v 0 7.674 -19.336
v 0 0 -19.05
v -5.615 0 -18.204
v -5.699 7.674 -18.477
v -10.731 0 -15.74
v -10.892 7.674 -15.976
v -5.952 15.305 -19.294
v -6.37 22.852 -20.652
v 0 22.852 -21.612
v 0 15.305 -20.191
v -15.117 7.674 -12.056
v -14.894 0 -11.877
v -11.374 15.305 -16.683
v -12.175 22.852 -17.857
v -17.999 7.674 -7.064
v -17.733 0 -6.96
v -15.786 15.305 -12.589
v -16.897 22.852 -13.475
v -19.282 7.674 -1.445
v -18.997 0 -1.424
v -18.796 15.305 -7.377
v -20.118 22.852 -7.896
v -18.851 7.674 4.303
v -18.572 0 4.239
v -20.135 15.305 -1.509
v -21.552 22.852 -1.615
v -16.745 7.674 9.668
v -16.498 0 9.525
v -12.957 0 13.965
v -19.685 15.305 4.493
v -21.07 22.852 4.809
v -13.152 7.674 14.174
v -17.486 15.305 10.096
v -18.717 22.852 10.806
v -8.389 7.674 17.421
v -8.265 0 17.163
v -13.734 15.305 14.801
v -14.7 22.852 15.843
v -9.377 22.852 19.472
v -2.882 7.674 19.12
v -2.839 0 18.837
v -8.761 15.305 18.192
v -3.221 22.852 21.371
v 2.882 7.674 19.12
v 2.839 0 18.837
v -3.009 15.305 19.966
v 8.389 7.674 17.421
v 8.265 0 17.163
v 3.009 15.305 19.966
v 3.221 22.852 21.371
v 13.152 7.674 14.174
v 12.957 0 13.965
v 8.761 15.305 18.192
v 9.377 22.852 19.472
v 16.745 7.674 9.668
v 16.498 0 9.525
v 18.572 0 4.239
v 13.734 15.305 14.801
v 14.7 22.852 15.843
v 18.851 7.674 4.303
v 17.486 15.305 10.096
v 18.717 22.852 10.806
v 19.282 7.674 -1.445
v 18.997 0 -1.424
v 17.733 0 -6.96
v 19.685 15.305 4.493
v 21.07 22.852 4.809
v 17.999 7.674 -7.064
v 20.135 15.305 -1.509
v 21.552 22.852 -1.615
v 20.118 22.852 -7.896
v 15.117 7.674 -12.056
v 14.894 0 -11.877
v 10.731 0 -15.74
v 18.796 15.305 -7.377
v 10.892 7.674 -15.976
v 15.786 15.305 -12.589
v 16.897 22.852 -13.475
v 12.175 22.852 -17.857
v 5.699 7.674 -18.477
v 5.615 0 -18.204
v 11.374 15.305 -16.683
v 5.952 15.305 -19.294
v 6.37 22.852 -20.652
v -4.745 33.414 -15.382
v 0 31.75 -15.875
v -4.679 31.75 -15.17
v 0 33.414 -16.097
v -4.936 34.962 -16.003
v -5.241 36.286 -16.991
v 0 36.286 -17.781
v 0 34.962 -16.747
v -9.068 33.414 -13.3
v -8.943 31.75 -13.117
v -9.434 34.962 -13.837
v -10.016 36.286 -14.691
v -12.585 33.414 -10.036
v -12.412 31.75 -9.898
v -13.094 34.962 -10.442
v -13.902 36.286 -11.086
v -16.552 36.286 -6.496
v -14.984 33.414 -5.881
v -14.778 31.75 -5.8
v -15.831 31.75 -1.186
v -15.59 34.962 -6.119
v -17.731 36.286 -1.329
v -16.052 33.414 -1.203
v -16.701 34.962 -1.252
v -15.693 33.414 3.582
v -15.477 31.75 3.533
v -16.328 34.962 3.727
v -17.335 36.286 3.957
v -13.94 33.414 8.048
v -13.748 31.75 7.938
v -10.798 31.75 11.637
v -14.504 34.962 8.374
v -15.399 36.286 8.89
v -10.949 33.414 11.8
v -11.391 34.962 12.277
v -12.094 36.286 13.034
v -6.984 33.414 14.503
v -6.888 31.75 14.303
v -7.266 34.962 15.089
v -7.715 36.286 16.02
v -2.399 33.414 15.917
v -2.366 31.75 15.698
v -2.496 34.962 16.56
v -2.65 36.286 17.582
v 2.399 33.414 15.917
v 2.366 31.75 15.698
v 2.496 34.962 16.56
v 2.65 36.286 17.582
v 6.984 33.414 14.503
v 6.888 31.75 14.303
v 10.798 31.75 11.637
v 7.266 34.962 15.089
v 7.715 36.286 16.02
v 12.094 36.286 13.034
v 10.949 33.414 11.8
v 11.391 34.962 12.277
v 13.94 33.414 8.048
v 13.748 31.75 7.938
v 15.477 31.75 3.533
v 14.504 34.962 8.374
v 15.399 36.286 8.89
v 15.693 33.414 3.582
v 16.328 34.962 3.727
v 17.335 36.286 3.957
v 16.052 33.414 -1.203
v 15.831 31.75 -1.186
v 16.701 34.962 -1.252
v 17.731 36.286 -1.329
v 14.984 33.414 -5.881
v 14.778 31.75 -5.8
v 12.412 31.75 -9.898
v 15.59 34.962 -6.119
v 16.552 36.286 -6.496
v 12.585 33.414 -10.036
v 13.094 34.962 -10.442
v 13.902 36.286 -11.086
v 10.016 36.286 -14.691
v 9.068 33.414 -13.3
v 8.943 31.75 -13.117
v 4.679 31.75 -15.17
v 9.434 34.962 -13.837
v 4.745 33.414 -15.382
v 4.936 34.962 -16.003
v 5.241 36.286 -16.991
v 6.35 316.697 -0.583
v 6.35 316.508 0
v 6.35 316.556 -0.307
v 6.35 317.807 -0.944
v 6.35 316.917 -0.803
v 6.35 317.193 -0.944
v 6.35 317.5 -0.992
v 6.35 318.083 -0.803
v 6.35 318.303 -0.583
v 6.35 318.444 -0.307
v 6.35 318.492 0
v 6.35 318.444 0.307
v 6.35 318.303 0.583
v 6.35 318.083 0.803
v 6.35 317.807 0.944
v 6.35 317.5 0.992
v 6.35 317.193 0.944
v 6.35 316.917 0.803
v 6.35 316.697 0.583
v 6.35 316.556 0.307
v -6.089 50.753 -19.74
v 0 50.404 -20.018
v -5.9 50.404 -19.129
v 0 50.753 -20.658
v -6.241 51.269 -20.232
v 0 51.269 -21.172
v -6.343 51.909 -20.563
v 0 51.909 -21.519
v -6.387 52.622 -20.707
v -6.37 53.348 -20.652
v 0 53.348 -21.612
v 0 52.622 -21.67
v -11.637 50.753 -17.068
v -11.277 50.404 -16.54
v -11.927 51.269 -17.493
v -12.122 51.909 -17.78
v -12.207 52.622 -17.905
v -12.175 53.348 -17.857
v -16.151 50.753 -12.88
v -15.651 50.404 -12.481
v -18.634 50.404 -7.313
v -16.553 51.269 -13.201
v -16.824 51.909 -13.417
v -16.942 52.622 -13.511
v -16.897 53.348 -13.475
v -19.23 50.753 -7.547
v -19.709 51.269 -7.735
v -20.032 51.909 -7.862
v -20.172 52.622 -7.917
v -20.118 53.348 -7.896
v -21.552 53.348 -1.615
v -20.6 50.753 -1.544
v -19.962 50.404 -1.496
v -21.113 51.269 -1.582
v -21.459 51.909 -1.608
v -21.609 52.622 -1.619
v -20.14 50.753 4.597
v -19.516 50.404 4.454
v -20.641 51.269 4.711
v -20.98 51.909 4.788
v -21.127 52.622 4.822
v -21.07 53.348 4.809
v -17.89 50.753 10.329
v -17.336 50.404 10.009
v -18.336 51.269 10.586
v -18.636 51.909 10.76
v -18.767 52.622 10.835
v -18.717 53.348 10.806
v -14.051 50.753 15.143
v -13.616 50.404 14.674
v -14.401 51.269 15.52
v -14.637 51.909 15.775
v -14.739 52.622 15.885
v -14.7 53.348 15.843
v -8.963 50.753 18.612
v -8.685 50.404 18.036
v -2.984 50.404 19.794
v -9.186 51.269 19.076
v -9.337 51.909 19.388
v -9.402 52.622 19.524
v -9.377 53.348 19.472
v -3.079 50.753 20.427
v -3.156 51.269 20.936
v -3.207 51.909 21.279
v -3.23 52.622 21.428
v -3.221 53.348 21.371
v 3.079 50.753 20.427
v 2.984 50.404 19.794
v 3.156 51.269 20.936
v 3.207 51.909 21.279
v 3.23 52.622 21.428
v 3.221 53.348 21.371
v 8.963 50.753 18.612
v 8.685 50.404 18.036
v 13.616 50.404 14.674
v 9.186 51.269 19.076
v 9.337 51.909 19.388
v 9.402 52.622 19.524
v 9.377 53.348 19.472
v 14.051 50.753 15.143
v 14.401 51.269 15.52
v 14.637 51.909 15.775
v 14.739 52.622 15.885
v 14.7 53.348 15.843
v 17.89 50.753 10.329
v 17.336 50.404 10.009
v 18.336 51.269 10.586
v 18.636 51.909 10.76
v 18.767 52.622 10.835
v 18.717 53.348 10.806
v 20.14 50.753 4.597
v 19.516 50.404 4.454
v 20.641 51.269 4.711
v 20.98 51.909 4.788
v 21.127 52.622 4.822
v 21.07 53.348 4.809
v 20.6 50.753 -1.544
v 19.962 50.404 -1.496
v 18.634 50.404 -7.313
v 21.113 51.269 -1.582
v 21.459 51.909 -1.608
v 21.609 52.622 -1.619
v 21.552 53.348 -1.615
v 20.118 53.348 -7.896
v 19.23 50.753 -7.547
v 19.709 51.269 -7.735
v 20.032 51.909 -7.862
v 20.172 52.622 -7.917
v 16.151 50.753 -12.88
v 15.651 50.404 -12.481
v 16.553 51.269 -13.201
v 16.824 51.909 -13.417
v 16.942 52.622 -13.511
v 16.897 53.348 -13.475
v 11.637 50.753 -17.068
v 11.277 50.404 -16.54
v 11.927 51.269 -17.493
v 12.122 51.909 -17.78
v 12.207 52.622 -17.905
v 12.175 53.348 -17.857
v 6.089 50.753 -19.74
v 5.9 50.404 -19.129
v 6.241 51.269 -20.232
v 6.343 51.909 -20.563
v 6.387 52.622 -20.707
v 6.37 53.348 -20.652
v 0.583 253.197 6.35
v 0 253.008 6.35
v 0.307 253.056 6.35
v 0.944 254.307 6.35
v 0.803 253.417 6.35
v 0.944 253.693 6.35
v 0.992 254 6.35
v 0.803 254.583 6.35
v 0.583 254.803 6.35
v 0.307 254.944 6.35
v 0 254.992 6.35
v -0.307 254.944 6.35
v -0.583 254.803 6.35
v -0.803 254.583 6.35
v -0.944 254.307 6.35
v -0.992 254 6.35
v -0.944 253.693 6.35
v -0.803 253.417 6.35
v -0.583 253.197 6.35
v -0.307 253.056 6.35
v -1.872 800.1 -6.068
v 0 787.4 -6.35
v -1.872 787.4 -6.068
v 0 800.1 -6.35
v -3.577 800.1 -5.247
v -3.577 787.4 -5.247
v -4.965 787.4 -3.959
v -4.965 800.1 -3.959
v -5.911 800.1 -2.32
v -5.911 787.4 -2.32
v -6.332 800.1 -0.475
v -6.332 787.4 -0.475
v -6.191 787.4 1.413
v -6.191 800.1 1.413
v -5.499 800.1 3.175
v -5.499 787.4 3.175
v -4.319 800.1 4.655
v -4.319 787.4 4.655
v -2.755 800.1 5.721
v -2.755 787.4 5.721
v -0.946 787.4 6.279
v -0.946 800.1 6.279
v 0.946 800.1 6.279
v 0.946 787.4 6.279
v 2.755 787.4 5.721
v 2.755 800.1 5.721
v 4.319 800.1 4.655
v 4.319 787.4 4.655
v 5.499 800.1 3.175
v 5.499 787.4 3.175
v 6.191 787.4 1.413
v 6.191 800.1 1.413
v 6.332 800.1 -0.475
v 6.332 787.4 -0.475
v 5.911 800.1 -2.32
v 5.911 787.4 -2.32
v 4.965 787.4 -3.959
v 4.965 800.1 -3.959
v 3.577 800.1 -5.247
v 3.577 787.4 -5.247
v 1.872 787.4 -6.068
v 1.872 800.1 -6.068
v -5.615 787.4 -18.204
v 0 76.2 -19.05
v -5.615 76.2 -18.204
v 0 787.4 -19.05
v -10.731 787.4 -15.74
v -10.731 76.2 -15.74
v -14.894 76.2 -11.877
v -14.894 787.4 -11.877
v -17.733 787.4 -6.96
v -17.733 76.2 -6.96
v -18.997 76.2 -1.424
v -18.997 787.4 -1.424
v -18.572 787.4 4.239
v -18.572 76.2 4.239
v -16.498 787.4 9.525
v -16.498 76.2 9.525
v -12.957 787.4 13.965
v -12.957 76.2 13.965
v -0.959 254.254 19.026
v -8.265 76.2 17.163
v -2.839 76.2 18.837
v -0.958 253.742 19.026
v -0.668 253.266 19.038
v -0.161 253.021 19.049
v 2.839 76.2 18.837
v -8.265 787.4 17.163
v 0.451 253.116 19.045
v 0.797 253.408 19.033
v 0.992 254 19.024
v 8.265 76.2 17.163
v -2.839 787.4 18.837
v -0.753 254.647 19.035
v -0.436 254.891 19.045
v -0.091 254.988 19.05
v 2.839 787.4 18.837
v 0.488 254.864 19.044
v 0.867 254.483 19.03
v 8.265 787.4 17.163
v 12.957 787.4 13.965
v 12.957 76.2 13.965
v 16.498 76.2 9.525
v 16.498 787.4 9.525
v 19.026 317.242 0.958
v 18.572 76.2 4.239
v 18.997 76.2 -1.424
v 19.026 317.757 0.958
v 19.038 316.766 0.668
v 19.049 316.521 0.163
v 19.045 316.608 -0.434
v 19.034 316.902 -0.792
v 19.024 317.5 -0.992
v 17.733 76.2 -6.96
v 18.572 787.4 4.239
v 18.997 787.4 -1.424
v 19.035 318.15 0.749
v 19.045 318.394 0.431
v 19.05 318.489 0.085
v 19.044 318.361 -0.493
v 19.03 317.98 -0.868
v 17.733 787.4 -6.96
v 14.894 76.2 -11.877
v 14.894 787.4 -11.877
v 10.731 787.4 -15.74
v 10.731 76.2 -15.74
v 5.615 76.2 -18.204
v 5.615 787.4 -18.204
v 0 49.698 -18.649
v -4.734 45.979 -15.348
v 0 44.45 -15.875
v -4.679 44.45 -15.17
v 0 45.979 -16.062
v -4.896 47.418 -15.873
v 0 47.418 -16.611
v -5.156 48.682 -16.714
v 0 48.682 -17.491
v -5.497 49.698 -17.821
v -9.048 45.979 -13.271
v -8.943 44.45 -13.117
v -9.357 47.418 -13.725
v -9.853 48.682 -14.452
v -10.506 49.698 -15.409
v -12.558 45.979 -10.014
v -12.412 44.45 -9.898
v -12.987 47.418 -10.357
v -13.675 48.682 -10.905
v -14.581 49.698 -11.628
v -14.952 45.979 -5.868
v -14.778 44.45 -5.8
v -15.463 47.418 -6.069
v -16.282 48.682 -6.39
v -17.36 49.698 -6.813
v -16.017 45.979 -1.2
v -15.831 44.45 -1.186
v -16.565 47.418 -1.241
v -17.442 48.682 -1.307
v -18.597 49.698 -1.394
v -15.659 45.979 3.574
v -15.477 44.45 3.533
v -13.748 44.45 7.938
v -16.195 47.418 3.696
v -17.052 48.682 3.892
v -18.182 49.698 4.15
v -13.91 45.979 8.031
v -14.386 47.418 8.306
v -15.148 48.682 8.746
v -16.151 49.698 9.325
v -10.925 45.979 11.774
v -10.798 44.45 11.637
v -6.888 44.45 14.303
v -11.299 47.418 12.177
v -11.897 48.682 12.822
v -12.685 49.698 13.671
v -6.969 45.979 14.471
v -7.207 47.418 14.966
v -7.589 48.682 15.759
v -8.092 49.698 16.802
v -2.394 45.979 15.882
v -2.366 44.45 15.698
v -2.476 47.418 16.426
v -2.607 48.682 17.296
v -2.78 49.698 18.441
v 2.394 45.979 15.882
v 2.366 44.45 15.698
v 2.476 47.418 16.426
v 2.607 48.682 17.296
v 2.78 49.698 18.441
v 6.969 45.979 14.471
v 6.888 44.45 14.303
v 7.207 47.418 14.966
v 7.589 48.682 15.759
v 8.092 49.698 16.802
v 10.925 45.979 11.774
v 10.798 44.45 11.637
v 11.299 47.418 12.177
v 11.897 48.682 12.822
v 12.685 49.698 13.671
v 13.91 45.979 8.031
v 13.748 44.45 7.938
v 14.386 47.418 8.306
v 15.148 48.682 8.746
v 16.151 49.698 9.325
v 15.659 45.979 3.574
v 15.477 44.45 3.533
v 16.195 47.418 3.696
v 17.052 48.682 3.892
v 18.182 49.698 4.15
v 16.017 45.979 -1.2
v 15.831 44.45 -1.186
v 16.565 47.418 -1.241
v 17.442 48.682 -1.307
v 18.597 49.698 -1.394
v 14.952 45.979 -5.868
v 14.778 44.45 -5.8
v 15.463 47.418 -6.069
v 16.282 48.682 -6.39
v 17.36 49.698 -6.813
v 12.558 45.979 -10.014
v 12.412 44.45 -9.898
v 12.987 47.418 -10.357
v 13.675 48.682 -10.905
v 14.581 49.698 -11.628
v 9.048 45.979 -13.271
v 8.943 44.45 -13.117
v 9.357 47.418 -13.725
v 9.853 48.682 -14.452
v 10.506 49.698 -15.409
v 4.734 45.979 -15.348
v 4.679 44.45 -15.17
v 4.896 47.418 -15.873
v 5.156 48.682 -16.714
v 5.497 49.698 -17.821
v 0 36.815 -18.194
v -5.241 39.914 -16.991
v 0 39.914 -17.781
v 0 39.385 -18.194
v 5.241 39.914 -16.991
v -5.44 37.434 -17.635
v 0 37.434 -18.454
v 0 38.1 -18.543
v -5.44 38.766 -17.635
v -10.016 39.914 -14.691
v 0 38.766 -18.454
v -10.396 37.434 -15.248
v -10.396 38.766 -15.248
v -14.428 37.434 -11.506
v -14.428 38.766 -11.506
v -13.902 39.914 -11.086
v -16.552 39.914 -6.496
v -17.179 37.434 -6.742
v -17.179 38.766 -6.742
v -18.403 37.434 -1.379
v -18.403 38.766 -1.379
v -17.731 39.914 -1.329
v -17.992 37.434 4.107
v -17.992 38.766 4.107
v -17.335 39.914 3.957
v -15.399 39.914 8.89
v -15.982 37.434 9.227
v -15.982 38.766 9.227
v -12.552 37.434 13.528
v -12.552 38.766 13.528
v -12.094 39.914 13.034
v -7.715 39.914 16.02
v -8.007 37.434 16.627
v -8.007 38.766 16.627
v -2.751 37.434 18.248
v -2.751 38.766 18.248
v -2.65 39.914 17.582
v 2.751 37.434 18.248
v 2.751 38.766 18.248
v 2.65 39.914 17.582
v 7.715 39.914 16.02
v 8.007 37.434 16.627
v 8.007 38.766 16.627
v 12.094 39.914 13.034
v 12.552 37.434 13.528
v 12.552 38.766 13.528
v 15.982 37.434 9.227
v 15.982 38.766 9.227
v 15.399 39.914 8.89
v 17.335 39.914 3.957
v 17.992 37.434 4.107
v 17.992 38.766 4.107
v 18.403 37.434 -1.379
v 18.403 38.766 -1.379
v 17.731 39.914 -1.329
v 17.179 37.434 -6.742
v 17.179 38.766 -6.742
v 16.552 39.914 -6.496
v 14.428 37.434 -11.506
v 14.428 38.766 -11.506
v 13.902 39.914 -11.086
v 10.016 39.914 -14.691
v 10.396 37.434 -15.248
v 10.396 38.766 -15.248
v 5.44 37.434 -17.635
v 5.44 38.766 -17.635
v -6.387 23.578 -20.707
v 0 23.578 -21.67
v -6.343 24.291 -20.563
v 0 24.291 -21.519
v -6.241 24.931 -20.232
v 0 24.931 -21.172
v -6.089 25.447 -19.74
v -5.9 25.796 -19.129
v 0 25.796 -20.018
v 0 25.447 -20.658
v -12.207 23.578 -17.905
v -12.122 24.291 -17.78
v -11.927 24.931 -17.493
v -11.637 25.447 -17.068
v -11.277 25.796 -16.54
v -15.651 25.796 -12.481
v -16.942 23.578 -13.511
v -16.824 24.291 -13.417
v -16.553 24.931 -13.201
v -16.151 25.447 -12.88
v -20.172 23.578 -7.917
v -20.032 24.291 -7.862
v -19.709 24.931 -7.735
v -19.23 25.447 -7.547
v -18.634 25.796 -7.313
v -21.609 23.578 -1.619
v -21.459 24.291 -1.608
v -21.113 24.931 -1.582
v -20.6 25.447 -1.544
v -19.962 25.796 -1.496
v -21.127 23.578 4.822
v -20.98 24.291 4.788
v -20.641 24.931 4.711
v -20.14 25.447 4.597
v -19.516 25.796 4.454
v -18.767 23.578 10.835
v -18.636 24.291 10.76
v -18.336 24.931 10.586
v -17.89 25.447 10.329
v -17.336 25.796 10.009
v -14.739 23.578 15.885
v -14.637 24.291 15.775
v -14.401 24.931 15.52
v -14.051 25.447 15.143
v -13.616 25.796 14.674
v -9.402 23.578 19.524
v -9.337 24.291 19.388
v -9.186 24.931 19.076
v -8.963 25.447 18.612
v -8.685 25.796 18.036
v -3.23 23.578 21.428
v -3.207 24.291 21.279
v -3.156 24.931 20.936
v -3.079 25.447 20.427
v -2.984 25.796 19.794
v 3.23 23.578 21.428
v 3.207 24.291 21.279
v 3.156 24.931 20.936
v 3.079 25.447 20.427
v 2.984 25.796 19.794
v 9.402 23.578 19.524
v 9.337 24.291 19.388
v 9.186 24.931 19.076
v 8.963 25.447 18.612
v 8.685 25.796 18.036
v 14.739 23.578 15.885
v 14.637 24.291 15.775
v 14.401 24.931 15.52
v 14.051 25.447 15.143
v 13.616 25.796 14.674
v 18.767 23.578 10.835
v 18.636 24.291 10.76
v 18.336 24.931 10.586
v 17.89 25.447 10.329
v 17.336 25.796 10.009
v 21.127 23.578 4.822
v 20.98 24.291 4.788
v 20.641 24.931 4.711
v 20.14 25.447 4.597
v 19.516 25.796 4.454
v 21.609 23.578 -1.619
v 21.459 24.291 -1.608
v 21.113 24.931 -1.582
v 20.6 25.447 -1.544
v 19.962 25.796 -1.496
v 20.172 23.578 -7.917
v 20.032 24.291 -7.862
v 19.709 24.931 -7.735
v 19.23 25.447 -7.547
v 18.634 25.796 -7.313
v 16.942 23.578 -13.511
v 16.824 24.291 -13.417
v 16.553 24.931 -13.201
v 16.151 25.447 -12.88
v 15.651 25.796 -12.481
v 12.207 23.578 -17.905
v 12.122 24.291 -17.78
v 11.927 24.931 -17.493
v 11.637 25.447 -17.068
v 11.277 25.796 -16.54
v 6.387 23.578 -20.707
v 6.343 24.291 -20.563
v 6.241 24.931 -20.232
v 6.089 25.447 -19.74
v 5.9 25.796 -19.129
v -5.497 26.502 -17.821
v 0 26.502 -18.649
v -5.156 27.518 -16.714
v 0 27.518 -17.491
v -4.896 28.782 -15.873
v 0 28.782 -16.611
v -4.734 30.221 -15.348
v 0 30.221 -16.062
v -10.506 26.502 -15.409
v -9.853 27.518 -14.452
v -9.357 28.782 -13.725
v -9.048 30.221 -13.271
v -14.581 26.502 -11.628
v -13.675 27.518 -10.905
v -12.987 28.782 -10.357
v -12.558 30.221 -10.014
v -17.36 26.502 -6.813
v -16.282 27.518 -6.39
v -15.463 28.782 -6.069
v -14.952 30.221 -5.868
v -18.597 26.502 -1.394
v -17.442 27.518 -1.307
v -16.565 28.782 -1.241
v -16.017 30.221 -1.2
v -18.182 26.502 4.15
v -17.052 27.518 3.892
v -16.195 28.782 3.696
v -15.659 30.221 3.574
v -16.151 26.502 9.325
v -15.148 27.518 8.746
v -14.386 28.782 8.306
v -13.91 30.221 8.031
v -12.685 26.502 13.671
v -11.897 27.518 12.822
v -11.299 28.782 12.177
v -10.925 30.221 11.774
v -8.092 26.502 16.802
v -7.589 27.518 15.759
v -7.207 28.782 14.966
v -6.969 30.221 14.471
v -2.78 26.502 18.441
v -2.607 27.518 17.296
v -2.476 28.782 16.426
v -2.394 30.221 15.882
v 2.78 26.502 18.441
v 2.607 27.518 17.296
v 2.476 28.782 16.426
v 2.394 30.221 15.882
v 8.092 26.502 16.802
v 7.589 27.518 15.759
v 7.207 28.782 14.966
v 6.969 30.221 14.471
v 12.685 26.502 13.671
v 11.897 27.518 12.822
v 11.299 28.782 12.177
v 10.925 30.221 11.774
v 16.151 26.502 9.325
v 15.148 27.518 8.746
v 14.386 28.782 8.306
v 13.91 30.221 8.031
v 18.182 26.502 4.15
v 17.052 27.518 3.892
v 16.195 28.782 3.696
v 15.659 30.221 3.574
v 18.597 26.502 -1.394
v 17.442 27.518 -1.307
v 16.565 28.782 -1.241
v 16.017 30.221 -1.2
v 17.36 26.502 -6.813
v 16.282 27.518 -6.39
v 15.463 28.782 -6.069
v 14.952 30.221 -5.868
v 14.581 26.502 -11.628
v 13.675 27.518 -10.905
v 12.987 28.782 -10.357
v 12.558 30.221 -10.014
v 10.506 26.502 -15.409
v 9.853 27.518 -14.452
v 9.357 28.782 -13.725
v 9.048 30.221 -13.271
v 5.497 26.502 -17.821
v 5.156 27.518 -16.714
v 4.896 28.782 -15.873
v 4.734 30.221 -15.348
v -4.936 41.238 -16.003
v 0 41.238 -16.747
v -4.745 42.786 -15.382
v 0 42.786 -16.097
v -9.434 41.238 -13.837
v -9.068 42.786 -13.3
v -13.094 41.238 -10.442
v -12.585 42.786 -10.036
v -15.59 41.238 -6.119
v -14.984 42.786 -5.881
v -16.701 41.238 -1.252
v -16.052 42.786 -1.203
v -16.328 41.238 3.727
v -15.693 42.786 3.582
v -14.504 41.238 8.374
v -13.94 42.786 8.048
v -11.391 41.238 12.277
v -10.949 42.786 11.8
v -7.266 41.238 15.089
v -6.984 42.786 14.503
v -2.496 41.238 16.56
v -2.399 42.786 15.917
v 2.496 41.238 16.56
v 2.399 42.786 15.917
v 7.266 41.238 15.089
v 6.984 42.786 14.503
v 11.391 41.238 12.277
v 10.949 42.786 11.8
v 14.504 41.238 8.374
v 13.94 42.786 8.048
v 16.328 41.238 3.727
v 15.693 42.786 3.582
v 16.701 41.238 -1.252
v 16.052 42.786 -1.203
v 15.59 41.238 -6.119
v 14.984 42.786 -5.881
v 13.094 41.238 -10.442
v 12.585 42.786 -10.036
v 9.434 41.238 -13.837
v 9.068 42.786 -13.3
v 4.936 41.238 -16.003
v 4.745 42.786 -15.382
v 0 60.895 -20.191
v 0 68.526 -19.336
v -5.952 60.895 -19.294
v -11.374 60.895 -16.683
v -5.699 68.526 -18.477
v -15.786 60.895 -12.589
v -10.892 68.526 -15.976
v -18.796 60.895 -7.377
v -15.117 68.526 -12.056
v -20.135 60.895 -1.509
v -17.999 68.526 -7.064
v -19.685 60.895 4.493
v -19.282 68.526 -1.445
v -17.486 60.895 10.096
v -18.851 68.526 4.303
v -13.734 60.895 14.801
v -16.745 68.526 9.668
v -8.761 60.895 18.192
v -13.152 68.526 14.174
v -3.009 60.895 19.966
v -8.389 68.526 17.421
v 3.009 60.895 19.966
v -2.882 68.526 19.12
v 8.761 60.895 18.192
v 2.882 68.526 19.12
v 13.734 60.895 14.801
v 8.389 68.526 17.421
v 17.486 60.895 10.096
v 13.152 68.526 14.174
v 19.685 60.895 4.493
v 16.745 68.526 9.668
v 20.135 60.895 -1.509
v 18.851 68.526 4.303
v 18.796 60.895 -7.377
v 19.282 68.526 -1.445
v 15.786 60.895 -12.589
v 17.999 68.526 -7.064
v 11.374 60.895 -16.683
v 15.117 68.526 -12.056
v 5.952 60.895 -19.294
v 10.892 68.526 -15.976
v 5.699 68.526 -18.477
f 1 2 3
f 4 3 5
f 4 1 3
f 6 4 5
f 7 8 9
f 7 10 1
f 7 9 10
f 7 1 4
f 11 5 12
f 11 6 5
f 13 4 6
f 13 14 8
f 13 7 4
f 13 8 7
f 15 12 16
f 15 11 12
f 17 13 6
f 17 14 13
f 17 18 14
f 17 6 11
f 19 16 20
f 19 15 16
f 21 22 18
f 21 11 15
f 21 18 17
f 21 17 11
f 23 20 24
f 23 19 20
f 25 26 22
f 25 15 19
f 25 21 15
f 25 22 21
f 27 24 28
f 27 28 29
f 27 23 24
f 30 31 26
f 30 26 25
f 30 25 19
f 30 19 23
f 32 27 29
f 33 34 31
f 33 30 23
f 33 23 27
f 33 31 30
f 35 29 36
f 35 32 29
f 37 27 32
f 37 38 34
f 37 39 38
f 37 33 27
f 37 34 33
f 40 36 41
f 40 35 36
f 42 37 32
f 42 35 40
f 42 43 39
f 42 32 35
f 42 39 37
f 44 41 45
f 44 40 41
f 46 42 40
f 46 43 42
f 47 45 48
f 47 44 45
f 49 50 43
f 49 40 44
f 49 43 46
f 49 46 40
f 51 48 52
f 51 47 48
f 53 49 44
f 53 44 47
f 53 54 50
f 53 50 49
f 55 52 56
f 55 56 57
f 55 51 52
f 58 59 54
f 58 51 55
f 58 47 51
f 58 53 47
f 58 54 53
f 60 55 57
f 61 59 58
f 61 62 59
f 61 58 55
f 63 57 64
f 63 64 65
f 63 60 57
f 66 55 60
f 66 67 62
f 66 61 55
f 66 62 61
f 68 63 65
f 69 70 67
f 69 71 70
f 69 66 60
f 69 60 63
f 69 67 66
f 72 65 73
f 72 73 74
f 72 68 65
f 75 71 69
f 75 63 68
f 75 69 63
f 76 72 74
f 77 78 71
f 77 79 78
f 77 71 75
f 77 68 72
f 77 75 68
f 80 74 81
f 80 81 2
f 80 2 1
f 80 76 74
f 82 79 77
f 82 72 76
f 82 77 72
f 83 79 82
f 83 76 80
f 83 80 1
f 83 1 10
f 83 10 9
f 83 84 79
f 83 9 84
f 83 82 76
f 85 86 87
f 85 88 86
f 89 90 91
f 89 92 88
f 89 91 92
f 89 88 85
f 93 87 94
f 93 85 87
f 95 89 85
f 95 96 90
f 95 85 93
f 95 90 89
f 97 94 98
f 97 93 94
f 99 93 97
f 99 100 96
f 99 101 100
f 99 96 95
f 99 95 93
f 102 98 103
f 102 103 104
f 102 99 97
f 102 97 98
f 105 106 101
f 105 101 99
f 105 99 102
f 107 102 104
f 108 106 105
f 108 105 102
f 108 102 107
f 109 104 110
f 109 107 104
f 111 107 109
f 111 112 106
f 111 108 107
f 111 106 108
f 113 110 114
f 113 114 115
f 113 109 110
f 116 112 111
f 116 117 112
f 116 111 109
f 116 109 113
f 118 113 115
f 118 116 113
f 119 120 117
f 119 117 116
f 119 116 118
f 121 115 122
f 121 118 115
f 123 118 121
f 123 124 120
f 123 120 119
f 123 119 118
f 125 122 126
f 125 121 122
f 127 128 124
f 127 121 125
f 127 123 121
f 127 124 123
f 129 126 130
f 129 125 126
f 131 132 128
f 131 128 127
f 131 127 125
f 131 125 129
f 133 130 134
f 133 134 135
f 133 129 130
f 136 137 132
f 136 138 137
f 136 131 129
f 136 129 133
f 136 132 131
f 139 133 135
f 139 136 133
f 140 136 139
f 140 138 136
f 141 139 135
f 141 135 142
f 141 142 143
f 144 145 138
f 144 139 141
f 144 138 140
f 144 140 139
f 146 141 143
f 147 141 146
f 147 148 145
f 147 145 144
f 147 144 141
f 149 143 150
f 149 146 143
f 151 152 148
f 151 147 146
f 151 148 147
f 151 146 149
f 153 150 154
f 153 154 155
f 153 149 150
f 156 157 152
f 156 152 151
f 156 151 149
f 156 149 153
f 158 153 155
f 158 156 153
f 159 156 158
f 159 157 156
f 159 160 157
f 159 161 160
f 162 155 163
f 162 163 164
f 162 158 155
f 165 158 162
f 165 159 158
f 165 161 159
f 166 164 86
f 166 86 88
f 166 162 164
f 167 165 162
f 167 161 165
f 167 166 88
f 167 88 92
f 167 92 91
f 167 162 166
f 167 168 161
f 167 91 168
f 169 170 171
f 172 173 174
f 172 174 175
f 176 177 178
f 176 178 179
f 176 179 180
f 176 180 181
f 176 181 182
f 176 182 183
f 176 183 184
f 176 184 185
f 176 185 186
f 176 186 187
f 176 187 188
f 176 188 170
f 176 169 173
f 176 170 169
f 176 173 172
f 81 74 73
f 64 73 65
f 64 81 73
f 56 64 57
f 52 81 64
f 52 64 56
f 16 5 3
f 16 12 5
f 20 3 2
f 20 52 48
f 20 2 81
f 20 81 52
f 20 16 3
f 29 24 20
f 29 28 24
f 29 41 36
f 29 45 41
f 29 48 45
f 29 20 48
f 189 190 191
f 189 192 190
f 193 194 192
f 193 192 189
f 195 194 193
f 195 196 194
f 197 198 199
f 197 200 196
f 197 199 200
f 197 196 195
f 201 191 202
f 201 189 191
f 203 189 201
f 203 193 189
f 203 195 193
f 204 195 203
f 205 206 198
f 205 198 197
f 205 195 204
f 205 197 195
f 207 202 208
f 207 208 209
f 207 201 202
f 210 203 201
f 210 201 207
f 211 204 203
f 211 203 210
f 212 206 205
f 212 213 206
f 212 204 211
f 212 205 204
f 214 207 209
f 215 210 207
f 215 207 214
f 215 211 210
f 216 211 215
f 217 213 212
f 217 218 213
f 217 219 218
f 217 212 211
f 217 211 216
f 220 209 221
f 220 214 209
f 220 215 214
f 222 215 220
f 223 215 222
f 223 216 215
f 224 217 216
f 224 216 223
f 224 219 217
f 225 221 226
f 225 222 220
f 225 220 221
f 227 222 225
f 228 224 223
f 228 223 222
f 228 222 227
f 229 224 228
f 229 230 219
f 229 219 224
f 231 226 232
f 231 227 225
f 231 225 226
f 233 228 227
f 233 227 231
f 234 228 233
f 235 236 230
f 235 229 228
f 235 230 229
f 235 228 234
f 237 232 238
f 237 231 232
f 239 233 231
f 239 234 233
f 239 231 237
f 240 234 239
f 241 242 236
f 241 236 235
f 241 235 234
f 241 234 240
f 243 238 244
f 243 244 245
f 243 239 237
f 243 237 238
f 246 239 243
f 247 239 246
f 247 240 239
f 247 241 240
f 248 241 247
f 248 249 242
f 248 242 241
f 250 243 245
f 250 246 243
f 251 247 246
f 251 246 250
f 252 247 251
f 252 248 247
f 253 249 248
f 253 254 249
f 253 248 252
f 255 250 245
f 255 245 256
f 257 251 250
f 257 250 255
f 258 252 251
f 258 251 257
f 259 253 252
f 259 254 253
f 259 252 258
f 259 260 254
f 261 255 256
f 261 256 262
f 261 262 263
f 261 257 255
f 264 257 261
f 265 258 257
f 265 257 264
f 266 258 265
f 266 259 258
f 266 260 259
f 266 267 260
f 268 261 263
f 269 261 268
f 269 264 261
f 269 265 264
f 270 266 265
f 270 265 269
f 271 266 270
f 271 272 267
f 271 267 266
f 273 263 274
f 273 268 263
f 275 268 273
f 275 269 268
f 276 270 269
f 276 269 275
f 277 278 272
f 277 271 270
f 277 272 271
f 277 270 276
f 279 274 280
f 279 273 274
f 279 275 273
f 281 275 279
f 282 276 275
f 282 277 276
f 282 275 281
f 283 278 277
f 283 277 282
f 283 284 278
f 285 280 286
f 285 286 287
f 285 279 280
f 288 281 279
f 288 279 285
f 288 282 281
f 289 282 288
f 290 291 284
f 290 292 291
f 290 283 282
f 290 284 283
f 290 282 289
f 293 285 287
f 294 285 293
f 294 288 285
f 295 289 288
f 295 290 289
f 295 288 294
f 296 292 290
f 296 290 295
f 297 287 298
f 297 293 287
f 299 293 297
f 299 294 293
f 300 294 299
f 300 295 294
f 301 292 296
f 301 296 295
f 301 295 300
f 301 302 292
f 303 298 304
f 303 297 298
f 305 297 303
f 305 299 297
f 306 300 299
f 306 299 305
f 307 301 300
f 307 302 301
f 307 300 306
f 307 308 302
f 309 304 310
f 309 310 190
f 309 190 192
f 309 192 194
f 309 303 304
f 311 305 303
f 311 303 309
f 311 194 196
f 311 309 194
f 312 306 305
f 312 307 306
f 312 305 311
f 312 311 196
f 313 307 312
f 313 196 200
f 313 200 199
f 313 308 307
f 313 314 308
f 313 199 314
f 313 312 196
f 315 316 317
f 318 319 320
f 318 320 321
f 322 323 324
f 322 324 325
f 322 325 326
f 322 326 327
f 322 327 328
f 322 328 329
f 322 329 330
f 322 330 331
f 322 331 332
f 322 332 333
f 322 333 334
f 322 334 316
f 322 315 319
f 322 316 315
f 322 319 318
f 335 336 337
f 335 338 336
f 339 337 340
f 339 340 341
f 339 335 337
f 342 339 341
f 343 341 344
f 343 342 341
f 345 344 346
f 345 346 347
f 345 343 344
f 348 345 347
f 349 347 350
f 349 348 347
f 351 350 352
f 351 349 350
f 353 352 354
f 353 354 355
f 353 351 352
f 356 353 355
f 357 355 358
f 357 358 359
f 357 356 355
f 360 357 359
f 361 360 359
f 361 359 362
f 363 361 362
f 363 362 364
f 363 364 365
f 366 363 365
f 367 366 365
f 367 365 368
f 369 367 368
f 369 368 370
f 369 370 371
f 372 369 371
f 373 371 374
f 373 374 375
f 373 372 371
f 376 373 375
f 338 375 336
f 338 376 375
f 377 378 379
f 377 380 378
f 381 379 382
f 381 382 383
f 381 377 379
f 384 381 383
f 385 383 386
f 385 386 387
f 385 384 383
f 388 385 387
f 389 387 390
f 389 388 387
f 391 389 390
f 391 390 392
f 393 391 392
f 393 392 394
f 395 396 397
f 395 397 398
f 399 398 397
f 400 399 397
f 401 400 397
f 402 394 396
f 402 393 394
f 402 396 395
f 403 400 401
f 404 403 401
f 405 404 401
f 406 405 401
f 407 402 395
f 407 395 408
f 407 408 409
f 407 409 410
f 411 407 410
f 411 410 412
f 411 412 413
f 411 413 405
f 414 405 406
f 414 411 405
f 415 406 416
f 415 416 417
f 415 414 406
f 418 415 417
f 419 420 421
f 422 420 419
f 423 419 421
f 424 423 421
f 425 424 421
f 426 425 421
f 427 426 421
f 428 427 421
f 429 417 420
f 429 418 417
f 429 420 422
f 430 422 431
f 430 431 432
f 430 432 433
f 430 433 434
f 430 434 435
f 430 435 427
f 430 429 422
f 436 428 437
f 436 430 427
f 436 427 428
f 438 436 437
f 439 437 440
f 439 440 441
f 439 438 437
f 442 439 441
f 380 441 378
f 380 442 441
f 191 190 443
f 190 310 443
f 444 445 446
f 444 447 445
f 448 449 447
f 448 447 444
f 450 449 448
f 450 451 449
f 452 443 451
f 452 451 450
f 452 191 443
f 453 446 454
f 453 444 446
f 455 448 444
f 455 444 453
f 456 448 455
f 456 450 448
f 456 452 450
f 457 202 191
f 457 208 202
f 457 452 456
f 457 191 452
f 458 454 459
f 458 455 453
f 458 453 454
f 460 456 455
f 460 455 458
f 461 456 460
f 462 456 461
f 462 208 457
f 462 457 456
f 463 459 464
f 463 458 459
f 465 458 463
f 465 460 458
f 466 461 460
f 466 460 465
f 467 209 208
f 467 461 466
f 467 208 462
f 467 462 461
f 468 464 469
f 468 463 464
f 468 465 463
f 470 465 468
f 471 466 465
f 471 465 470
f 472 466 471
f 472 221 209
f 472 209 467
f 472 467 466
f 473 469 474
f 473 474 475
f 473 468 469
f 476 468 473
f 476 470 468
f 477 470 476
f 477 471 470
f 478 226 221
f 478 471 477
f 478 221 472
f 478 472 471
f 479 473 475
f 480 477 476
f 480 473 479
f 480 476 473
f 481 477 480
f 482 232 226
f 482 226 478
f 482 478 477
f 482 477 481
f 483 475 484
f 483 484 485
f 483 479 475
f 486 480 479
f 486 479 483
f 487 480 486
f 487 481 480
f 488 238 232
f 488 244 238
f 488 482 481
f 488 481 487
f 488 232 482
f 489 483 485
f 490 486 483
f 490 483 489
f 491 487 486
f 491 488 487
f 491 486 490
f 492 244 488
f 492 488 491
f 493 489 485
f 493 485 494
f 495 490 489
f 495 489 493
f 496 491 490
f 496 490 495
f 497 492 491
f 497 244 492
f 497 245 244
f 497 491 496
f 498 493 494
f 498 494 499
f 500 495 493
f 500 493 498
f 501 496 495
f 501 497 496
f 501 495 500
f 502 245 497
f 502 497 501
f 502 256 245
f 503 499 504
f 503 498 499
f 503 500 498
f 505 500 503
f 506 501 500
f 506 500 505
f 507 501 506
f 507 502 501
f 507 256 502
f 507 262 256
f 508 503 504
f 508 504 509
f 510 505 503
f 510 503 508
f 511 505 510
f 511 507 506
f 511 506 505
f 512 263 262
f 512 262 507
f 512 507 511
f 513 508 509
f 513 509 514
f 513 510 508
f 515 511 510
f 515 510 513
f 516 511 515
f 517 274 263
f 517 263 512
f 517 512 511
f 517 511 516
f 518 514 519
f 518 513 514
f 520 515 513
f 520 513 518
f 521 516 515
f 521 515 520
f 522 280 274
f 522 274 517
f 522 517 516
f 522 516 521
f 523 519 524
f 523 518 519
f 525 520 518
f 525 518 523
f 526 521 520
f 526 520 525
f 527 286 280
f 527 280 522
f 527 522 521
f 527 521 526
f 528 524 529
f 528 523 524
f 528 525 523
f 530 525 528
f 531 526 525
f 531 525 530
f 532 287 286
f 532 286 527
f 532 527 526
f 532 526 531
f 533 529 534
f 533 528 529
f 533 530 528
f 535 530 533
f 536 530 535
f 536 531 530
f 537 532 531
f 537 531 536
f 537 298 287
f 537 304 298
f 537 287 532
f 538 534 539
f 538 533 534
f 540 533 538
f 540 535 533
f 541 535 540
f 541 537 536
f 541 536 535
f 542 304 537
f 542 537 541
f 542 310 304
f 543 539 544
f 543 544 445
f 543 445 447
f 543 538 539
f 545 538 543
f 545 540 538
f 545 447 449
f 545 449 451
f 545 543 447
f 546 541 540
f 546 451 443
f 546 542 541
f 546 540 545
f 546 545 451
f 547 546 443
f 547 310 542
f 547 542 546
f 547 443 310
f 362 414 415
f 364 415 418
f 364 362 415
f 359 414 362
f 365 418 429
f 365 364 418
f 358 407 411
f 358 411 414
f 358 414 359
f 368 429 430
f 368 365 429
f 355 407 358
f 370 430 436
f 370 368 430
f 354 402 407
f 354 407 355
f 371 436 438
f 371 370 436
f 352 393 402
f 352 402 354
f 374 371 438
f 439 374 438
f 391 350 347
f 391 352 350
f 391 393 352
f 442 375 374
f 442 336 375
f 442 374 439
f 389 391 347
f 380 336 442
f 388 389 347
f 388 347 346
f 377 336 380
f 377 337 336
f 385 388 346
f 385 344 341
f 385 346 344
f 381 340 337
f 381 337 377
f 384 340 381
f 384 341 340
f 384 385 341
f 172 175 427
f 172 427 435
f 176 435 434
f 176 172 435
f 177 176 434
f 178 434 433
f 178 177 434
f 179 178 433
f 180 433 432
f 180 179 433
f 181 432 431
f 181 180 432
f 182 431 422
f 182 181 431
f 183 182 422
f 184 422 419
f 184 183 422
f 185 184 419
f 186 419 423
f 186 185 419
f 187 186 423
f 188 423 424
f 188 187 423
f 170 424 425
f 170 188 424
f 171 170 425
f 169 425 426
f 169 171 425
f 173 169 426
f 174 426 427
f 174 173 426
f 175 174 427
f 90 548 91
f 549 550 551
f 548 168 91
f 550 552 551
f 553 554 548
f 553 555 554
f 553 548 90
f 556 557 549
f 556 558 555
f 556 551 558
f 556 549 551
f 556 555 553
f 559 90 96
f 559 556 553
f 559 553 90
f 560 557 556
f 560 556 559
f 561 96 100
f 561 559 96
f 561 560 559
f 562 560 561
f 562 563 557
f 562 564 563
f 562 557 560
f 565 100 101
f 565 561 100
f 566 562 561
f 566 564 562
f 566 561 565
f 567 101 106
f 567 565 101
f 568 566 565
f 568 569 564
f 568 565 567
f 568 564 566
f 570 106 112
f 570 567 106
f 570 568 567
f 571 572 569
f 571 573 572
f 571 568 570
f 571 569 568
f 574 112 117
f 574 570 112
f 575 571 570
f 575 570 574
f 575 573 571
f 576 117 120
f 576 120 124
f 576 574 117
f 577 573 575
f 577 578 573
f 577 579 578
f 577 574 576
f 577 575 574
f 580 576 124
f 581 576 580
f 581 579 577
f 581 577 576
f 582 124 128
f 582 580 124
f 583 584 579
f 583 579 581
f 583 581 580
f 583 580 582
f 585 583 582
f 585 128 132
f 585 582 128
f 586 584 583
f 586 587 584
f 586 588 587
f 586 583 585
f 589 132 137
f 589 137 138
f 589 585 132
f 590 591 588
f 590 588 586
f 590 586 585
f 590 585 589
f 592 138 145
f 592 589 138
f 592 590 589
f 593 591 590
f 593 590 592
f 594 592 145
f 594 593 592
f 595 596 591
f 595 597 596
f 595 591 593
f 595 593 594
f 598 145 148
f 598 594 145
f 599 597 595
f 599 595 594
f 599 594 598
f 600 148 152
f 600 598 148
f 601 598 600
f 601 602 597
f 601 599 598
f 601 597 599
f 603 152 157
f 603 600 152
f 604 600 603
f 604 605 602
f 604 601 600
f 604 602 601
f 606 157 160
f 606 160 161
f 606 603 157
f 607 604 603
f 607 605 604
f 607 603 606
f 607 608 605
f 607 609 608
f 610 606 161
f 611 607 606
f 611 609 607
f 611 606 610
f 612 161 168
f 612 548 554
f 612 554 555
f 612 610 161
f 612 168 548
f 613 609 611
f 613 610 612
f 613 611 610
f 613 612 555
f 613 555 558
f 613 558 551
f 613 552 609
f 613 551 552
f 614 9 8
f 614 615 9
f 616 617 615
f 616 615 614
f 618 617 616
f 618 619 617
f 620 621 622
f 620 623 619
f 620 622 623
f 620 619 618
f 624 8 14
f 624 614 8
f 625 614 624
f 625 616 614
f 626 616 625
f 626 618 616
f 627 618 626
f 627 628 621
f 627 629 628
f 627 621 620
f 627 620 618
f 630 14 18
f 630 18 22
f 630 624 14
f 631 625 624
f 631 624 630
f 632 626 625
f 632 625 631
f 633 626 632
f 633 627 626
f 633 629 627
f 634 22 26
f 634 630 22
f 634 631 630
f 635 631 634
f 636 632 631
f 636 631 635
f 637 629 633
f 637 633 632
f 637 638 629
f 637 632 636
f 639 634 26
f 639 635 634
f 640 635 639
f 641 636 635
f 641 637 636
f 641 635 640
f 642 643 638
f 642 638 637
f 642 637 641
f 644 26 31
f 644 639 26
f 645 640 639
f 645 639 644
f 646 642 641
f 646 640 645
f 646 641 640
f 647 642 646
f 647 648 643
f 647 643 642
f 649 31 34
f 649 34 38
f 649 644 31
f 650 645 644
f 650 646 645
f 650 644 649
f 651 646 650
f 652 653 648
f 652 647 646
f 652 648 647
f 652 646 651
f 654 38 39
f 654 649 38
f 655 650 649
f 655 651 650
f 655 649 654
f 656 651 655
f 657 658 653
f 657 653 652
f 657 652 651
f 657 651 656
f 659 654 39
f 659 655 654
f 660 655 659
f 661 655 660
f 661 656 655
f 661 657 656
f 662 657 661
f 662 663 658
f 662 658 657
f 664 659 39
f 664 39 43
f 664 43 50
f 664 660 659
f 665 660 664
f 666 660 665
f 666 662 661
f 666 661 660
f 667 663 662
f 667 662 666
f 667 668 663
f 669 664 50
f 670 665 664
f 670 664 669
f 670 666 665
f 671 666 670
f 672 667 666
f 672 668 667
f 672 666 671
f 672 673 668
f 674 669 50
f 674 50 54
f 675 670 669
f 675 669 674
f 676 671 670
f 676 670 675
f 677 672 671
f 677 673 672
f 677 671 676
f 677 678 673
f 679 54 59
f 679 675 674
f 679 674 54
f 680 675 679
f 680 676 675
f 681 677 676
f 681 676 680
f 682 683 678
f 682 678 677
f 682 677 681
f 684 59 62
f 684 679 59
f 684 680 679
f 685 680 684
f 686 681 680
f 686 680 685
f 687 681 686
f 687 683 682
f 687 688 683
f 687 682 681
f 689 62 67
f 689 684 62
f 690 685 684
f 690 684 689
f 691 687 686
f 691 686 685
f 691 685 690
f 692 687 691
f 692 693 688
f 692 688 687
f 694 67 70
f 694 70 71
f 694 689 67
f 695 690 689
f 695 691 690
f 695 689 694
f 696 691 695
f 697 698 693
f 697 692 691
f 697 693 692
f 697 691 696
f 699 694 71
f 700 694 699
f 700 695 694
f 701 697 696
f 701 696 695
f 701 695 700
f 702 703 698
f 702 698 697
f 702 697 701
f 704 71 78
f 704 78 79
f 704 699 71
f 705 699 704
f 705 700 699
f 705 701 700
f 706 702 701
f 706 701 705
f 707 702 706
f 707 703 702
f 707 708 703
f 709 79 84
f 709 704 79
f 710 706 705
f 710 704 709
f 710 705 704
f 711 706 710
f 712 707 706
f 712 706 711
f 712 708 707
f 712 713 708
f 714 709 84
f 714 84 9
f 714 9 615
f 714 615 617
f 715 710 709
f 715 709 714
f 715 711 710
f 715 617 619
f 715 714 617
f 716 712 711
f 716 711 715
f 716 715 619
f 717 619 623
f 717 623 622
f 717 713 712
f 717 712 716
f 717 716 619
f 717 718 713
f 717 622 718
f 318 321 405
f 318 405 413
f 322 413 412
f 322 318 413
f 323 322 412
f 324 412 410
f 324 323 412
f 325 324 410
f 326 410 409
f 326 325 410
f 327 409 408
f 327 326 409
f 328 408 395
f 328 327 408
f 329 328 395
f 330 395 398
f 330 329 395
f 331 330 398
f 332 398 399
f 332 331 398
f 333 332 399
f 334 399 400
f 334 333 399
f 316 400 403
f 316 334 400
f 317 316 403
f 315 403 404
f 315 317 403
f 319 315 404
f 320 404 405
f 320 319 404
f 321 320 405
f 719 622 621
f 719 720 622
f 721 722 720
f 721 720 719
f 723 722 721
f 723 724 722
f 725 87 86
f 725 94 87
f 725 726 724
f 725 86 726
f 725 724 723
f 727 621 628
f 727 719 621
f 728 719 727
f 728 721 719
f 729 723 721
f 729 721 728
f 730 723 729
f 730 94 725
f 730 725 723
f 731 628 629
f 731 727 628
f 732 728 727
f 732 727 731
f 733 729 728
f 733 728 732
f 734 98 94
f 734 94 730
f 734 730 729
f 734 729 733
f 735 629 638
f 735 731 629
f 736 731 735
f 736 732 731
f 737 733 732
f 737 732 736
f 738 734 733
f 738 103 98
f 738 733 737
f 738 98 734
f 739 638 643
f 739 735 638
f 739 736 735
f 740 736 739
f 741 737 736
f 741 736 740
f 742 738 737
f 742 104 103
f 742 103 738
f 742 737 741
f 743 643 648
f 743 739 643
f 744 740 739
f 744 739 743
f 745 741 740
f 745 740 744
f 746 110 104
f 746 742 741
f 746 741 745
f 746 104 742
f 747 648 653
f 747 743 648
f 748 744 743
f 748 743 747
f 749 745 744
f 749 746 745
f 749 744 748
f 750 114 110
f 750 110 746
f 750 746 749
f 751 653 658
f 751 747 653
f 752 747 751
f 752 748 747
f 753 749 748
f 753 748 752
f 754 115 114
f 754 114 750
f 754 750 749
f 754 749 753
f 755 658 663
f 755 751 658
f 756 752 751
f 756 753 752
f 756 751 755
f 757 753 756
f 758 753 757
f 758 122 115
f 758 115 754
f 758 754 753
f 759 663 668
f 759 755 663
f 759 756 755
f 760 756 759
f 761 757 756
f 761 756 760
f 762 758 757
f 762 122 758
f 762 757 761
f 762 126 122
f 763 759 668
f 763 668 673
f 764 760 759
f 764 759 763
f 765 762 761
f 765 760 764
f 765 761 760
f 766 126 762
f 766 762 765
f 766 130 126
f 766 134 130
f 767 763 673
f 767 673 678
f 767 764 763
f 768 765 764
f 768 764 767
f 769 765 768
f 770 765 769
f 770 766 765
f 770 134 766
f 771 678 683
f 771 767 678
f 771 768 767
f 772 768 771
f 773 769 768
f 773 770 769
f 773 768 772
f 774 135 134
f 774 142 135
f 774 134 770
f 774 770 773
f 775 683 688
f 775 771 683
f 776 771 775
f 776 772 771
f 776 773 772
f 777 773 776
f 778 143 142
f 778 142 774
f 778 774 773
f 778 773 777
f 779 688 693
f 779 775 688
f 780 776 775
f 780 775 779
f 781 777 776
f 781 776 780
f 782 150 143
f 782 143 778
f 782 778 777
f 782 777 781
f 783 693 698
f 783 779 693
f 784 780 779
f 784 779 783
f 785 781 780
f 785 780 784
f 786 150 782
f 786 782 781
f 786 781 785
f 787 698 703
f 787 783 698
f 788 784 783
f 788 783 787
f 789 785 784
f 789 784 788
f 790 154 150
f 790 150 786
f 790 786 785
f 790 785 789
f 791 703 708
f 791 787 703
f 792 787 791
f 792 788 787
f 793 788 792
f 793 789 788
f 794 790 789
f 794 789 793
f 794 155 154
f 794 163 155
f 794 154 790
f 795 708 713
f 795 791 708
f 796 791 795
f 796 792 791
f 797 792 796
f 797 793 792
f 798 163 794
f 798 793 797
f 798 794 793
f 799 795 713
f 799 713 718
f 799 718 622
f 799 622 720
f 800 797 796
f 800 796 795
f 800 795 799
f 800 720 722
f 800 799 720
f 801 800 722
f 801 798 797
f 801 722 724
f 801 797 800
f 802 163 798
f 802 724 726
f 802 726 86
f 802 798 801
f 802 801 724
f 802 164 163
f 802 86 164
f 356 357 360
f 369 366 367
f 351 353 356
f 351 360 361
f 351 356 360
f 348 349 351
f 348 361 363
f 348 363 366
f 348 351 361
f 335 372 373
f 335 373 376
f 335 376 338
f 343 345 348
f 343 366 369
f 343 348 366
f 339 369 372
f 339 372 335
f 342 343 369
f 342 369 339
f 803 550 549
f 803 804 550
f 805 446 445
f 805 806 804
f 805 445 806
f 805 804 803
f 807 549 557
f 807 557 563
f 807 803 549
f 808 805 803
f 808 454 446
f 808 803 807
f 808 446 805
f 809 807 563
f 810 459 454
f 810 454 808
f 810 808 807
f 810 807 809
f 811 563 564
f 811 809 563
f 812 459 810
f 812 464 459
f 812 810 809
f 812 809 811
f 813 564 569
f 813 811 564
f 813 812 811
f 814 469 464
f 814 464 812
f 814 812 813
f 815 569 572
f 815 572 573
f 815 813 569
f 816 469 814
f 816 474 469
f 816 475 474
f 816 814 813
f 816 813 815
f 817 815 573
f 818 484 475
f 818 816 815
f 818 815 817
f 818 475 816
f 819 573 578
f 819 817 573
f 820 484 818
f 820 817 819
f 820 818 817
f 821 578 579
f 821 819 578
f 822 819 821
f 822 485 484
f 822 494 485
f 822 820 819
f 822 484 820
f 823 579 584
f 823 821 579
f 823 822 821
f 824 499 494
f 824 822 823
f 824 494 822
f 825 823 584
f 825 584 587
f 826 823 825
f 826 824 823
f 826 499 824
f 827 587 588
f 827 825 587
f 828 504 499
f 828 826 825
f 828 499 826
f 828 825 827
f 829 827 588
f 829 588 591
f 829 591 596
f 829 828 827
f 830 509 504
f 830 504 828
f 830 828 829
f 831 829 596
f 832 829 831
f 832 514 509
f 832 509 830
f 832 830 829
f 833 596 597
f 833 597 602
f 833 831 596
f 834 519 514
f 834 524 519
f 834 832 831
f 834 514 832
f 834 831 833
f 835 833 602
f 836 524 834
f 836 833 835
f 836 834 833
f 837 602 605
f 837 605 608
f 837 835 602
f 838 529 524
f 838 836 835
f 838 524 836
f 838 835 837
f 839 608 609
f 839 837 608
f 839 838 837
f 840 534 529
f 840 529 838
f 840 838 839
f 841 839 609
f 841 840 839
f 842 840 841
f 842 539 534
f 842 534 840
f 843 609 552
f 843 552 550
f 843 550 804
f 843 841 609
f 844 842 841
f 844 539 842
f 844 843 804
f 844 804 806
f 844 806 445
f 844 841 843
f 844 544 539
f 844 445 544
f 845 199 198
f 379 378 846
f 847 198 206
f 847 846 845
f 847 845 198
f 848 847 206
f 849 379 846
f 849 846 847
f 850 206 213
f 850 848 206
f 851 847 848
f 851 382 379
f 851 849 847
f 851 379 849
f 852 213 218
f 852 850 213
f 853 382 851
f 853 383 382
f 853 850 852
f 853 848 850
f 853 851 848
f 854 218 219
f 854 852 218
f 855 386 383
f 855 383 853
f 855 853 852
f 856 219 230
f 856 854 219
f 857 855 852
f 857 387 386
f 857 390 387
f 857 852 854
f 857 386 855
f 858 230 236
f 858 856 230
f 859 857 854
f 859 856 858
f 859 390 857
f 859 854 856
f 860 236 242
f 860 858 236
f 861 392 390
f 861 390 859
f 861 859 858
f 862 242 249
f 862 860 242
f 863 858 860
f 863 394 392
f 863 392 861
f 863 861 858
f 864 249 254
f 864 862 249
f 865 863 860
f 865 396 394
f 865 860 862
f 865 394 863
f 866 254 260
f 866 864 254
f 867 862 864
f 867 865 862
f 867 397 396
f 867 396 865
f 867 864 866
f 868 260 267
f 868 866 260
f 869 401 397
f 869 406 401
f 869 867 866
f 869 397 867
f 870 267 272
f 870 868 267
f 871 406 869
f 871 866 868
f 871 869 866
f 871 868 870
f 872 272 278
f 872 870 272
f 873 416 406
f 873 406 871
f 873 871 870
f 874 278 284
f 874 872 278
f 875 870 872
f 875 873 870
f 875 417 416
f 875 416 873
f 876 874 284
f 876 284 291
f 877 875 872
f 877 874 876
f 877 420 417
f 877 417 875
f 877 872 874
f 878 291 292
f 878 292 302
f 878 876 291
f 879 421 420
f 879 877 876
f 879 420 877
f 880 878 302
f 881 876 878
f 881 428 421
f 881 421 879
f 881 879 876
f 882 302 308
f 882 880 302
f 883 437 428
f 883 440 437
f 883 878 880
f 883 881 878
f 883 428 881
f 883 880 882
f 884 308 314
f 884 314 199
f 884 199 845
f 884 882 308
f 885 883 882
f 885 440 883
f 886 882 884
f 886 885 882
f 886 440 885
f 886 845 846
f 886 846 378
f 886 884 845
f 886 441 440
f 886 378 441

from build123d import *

# Parameters (mm, degrees)
CUT_EXTRUDE1_START = -12.7
SKETCH15_R         = 0.9921875
CUT_EXTRUDE1_DEPTH = 12.7
CUT_EXTRUDE2_START = -12.7
SKETCH16_R         = 0.9921875
CUT_EXTRUDE2_DEPTH = 12.7


with BuildPart() as part:
    # revolve sketch → Revolve1 (revolve)
    with BuildSketch(Plane.XY, mode=Mode.PRIVATE) as revolve1_sk:
        with BuildLine():
            Line((0, 0), (19.05, 0))
            ThreePointArc((19.05, 0), (19.692539758, 11.497446902), (21.612156952, 22.851706562))
            ThreePointArc((21.612156952, 22.851706562), (21.368821871, 24.623609523), (20.018018165, 25.795864363))
            ThreePointArc((20.018018165, 25.795864363), (17.012666806, 28.123144244), (15.875, 31.75))
            ThreePointArc((15.875, 31.75), (16.370840305, 34.209941923), (17.780925752, 36.285714286))
            ThreePointArc((17.780925752, 36.285714286), (18.543296053, 38.1), (17.780925752, 39.914285714))
            ThreePointArc((17.780925752, 39.914285714), (16.370840305, 41.990058077), (15.875, 44.45))
            ThreePointArc((15.875, 44.45), (17.012666806, 48.076855756), (20.018018165, 50.404135637))
            ThreePointArc((20.018018165, 50.404135637), (21.368821871, 51.576390477), (21.612156952, 53.348293438))
            ThreePointArc((21.612156952, 53.348293438), (19.692539758, 64.702553098), (19.05, 76.2))
            Line((19.05, 76.2), (19.05, 787.4))
            Line((19.05, 787.4), (6.35, 787.4))
            Line((6.35, 787.4), (6.35, 800.1))
            Line((6.35, 800.1), (0, 800.1))
            Line((0, 800.1), (0, 0))
        make_face()
    revolve(revolve1_sk.sketch.rotate(Axis((0, -55, 0), (0, 1, 0)), 90), axis=Axis((0, -55, 0), (0, 1, 0)))

    # Sketch15 → Cut-Extrude1 (cut)
    with BuildSketch(Plane.XY.offset(19.05).offset(CUT_EXTRUDE1_START)):
        with Locations((0, 254)):
            Circle(SKETCH15_R)
    extrude(amount=CUT_EXTRUDE1_DEPTH, mode=Mode.SUBTRACT)

    # Sketch16 → Cut-Extrude2 (cut)
    with BuildSketch(Plane(origin=(19.05, 0, 0), x_dir=(0, 0, -1), z_dir=(1, 0, 0)).offset(CUT_EXTRUDE2_START)):
        with Locations((0, 317.5)):
            Circle(SKETCH16_R)
    extrude(amount=CUT_EXTRUDE2_DEPTH, mode=Mode.SUBTRACT)


solid = part.part
